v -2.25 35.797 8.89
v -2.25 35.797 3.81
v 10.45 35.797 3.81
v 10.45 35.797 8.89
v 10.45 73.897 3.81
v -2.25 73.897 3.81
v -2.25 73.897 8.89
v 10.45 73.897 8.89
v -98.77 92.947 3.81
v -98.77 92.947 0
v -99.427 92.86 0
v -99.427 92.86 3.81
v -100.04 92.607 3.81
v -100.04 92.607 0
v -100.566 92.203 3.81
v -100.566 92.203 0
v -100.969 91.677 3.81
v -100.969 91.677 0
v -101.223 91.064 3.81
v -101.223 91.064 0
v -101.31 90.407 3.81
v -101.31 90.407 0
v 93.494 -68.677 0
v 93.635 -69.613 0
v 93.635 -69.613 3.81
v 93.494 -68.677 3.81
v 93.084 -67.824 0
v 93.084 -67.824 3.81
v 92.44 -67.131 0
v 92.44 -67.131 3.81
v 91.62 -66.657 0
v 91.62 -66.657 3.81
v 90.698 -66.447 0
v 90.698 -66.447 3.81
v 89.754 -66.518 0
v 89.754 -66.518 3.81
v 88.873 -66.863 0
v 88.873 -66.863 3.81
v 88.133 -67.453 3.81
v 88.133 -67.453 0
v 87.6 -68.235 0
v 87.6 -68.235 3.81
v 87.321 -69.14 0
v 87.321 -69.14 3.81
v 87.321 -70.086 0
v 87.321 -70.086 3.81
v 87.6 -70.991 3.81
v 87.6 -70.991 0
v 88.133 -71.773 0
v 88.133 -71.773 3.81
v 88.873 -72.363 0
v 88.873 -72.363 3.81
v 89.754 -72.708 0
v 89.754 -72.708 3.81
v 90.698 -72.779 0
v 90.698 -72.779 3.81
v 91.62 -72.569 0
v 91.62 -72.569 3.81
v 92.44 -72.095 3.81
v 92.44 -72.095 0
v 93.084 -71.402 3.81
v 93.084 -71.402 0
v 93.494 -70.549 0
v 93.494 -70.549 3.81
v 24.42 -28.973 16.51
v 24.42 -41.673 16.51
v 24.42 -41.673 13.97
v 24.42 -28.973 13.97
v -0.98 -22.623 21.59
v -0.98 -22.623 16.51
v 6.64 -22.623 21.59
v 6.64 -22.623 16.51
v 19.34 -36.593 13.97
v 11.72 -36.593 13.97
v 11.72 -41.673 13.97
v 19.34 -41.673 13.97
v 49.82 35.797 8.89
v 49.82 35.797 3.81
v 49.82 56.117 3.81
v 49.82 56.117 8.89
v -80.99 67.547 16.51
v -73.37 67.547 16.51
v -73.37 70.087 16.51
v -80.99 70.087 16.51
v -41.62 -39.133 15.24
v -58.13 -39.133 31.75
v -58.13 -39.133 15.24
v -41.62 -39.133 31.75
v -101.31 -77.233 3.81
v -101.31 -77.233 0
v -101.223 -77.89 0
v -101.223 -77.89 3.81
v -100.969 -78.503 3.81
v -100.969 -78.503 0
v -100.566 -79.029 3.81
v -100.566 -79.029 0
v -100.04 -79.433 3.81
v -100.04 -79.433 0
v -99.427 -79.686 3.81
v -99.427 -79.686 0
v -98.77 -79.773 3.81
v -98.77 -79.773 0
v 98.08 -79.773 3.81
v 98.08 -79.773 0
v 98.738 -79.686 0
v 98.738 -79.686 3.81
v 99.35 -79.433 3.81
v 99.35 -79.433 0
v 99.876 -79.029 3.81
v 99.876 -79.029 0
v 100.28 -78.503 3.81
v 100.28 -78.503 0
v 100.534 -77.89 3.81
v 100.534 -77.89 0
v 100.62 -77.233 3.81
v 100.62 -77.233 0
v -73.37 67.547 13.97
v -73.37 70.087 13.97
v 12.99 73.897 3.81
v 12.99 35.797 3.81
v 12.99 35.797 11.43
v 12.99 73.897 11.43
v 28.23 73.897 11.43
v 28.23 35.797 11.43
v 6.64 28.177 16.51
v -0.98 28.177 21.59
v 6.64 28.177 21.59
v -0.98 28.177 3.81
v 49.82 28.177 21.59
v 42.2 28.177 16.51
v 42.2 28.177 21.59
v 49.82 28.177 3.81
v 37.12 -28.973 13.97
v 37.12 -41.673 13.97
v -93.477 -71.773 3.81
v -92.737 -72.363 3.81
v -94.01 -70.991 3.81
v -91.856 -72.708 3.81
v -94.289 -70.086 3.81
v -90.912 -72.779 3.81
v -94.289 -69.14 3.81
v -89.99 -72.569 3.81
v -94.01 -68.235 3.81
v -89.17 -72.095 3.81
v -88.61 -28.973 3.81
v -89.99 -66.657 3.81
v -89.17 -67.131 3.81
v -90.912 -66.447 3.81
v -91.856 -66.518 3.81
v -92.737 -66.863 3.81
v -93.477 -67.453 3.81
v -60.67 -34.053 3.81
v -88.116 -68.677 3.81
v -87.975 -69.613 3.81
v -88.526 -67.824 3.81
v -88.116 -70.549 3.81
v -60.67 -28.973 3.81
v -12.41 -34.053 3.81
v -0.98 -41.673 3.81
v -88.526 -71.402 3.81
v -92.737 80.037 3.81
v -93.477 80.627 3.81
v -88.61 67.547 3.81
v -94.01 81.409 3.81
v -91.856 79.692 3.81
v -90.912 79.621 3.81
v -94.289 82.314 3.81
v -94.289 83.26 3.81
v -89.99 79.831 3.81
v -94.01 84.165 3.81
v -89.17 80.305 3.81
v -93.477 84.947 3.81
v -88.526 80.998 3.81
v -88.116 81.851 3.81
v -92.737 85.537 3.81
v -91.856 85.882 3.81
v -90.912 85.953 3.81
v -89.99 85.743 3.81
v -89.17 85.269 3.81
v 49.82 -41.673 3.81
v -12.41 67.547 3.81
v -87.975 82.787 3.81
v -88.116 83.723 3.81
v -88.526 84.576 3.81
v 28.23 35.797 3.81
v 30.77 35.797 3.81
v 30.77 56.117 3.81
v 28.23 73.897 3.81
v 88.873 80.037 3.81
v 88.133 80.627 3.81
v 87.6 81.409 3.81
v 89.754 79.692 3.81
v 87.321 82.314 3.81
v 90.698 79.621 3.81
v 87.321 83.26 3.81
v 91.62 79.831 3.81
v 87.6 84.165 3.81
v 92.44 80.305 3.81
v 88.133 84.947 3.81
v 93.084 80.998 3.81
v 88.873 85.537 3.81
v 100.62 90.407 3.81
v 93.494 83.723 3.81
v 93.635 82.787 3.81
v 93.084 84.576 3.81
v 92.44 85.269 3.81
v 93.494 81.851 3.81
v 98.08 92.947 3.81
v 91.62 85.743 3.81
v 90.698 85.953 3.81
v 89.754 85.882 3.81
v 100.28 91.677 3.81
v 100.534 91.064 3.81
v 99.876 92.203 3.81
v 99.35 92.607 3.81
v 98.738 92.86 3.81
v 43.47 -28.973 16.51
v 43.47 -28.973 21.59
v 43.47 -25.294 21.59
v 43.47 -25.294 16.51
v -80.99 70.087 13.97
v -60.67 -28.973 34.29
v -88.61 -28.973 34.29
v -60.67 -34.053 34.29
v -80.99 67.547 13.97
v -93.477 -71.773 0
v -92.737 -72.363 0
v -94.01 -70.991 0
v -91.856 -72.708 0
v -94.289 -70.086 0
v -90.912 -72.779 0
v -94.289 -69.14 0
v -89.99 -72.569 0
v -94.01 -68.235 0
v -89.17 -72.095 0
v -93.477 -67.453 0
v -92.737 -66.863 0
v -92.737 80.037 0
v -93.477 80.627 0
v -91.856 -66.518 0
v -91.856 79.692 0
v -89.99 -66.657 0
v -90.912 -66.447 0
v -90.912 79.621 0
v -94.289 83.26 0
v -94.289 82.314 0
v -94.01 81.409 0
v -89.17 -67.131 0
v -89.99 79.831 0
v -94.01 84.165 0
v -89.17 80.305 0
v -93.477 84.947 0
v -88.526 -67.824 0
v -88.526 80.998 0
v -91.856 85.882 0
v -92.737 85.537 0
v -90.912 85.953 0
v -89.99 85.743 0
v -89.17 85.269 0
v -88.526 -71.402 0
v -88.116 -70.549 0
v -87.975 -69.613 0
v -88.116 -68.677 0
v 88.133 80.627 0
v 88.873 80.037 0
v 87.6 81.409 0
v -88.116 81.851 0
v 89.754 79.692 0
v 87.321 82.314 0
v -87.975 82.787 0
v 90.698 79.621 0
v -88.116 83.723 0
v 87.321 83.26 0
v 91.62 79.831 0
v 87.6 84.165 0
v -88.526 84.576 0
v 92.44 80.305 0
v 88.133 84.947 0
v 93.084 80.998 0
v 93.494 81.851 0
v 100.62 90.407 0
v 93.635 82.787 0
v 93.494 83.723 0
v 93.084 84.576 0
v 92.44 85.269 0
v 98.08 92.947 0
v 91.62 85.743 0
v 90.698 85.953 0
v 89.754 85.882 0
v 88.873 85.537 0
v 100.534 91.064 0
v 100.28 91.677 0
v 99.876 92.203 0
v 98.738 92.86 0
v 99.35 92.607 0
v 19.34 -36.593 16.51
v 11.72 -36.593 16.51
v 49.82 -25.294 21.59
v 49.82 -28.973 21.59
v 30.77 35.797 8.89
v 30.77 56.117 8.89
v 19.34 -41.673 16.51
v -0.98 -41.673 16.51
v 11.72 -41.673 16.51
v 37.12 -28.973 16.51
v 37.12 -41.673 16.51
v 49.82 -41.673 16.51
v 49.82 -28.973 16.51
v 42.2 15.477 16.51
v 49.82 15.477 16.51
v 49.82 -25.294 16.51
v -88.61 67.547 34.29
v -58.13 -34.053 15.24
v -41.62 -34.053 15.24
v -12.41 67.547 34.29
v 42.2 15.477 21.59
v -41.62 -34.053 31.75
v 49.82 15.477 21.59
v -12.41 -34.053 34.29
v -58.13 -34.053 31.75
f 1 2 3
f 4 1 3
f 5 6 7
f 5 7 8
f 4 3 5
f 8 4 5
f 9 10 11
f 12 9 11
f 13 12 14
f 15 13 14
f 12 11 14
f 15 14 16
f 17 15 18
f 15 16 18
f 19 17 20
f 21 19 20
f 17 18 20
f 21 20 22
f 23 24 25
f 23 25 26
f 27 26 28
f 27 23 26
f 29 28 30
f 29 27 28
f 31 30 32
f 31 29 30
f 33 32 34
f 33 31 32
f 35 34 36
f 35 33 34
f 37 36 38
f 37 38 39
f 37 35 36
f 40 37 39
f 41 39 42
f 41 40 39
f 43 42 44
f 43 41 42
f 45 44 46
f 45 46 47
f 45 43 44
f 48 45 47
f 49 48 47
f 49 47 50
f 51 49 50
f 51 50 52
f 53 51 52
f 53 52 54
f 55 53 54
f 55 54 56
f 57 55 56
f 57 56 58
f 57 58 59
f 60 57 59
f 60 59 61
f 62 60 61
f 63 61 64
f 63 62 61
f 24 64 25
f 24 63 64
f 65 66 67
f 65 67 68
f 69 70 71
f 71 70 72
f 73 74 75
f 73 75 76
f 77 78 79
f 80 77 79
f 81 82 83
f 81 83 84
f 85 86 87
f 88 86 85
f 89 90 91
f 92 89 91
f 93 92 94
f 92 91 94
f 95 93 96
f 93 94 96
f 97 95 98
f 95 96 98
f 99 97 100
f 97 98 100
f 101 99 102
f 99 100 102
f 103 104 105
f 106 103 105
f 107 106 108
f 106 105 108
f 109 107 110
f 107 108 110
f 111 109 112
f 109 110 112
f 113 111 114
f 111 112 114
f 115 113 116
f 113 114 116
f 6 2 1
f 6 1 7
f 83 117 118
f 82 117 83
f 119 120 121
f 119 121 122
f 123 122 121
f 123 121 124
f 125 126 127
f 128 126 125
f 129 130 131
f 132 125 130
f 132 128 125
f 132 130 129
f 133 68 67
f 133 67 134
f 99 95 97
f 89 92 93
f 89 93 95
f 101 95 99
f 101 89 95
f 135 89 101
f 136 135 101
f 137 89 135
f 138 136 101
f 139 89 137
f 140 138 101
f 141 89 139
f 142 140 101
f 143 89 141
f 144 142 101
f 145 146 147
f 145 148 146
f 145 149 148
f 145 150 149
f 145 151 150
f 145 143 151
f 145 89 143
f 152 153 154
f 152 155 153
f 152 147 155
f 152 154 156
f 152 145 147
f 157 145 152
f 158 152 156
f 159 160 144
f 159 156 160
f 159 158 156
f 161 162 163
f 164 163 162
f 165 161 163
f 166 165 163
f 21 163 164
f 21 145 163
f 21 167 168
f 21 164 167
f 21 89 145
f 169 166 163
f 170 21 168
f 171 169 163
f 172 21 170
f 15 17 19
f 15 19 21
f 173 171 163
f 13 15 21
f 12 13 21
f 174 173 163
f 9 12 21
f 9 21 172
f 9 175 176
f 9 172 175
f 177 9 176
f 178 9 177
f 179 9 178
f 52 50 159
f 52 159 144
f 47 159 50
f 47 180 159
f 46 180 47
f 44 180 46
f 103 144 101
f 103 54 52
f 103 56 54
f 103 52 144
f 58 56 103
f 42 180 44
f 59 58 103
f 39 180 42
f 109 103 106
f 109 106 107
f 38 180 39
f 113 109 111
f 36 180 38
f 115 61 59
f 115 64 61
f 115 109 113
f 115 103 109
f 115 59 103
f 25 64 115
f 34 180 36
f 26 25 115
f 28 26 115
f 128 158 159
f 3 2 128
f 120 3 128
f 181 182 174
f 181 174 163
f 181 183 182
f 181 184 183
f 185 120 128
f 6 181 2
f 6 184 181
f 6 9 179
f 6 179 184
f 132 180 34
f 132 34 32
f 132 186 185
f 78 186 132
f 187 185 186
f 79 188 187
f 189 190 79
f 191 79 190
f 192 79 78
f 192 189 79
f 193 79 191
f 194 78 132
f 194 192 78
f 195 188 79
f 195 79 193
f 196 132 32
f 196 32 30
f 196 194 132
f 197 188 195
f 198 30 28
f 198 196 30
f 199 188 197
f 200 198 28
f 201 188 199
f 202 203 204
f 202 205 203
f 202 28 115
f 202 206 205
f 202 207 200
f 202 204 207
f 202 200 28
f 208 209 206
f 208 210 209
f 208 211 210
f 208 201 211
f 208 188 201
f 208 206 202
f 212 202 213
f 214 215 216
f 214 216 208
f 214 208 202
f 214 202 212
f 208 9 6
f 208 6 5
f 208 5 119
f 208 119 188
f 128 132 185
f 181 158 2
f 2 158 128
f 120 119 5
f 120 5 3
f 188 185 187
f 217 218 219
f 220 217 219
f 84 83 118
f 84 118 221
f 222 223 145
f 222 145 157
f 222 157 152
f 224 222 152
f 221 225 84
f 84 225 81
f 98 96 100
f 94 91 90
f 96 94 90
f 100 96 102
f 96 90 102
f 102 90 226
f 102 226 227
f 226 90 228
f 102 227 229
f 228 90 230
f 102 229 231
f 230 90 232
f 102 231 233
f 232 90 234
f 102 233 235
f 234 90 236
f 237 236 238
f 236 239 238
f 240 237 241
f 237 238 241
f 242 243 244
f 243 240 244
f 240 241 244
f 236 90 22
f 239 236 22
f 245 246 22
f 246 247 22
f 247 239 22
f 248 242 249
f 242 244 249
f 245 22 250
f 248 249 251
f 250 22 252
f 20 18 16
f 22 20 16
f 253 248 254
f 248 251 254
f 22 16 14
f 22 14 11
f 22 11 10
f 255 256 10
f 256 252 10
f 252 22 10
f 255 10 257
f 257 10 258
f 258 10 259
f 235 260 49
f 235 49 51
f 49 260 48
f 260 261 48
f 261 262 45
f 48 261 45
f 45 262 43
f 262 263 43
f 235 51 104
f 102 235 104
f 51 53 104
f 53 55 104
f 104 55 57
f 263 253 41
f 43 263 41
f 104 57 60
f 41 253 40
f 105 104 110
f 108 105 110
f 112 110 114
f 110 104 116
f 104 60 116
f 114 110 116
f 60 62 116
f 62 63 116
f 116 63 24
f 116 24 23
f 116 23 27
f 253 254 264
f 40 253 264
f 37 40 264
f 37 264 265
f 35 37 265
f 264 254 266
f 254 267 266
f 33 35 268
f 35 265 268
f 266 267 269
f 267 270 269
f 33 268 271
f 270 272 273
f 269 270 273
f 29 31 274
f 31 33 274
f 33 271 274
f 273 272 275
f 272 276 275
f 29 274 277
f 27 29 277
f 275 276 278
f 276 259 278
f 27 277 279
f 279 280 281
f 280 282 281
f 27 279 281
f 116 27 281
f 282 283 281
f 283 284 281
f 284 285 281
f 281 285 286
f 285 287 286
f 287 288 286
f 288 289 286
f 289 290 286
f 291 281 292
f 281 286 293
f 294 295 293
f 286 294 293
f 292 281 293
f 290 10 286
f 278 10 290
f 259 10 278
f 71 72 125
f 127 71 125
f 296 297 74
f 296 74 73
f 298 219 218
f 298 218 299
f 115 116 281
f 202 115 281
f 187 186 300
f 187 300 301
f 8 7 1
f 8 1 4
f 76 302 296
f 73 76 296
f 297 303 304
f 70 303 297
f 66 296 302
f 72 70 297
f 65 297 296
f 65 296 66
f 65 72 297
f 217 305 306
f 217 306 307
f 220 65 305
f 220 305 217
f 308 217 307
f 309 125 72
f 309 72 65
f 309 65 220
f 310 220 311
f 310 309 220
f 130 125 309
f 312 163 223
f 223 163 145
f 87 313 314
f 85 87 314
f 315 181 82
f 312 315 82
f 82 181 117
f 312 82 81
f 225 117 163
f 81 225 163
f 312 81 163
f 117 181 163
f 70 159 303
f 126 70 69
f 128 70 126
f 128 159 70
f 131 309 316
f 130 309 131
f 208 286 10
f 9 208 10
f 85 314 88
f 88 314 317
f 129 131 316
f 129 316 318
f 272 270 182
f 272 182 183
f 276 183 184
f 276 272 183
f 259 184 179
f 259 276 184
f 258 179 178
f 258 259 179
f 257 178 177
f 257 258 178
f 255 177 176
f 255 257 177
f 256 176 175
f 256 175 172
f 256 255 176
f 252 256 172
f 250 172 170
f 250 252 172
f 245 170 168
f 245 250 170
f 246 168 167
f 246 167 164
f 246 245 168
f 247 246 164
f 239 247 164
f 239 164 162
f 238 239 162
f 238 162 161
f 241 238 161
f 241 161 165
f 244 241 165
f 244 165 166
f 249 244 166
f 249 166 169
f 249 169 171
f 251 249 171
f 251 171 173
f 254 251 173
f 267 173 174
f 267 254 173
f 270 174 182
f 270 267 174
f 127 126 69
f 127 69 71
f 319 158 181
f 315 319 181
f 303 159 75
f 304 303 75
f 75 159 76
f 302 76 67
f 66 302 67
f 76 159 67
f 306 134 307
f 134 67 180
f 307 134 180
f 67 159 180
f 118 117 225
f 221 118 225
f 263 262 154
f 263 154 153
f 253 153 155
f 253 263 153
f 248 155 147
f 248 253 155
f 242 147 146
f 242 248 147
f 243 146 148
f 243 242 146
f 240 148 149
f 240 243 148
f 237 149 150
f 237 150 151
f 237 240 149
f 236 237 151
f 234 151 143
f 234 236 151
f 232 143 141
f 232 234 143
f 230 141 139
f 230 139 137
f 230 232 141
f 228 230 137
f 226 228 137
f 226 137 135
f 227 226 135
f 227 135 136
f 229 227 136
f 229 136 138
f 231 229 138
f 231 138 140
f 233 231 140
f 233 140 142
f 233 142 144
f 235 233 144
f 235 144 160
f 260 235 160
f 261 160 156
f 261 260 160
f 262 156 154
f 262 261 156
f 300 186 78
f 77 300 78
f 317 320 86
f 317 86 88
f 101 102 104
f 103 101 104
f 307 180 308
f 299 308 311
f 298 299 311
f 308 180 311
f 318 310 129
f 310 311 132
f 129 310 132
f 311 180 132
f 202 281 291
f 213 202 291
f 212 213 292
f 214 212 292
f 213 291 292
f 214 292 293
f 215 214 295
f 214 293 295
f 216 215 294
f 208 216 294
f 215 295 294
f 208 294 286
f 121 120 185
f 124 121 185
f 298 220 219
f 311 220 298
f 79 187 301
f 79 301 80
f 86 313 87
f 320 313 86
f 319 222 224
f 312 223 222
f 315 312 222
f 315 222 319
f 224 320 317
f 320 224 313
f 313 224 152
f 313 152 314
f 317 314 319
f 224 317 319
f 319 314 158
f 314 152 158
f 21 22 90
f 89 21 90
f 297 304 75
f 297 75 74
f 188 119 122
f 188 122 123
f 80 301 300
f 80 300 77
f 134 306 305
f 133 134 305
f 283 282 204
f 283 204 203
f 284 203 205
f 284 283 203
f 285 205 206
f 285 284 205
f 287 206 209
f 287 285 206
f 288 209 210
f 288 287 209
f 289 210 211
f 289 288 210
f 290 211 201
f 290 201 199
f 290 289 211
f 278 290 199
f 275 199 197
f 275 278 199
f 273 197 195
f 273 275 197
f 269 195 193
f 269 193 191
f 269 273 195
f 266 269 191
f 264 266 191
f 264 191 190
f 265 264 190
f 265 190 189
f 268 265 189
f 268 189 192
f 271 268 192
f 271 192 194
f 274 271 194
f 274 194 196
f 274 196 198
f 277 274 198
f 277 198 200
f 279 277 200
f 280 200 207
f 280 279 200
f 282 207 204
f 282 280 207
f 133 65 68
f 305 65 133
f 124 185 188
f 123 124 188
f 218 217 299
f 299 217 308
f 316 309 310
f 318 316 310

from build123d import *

# Parameters (mm, degrees)
F0_R      = 3.175
F1_DEPTH  = 3.81
F3_DEPTH  = 30.48
F2_W      = 50.8
F2_H      = 69.85
F4_DEPTH  = 12.7
F2_W_2    = 19.05
F2_H_2    = 20.32
F5_DEPTH  = 5.08
F2_W_3    = 15.24
F2_H_3    = 38.1
F6_DEPTH  = 7.62
F2_W_4    = 12.7
F7_DEPTH  = 5.08
F8_W      = 16.51
F8_H      = 16.51
F9_DEPTH  = 5.08
F10_W     = 7.62
F10_H     = 2.54
F11_DEPTH = 2.54
F12_W     = 7.62
F12_H     = 12.7
F12_H_2   = 50.8
F13_DEPTH = 5.08
F14_W     = 6.35
F14_H     = 3.679095
F15_DEPTH = 5.08
F16_W     = 12.7
F16_H     = 12.7
F17_DEPTH = 2.54
F18_W     = 7.62
F18_H     = 5.08
F19_DEPTH = 2.54


with BuildPart() as f1:
    # F0 (on Top) → F1 (new body)
    with BuildSketch(Plane.XY):
        with BuildLine():
            Line((98.080416, 92.946989), (-98.769584, 92.946989))
            ThreePointArc((-98.769584, 92.946989), (-100.565635, 92.20304), (-101.309584, 90.406989))
            Line((-101.309584, 90.406989), (-101.309584, -77.233011))
            ThreePointArc((-101.309584, -77.233011), (-100.565635, -79.029062), (-98.769584, -79.773011))
            Line((-98.769584, -79.773011), (98.080416, -79.773011))
            ThreePointArc((98.080416, -79.773011), (99.876467, -79.029062), (100.620416, -77.233011))
            Line((100.620416, -77.233011), (100.620416, 90.406989))
            ThreePointArc((100.620416, 90.406989), (99.876467, 92.20304), (98.080416, 92.946989))
        make_face()
        with Locations((-91.149584, -69.613011)):
            Circle(F0_R, mode=Mode.SUBTRACT)
        with Locations((90.460416, -69.613011)):
            Circle(F0_R, mode=Mode.SUBTRACT)
        with Locations((-91.149584, 82.786989)):
            Circle(F0_R, mode=Mode.SUBTRACT)
        with Locations((90.460416, 82.786989)):
            Circle(F0_R, mode=Mode.SUBTRACT)
    extrude(amount=F1_DEPTH)

    # F2 (on face) → F3 (join)
    with BuildSketch(Plane.XY.offset(3.81)):
        Polygon((-12.409584, 67.546989), (-88.609584, 67.546989), (-88.609584, -28.973011), (-60.669584, -28.973011), (-60.669584, -34.053011), (-12.409584, -34.053011), align=None)
    extrude(amount=F3_DEPTH)

    # F2 (on face) → F4 (join)
    with BuildSketch(Plane.XY.offset(3.81)):
        with Locations((24.420416, -6.748011)):
            Rectangle(F2_W, F2_H)
    extrude(amount=F4_DEPTH)

    # F2 (on face) → F5 (join)
    with BuildSketch(Plane.XY.offset(3.81)):
        with Locations((40.295416, 45.956989)):
            Rectangle(F2_W_2, F2_H_2)
    extrude(amount=F5_DEPTH)

    # F2 (on face) → F6 (join)
    with BuildSketch(Plane.XY.offset(3.81)):
        with Locations((20.610416, 54.846989)):
            Rectangle(F2_W_3, F2_H_3)
    extrude(amount=F6_DEPTH)

    # F2 (on face) → F7 (join)
    with BuildSketch(Plane.XY.offset(3.81)):
        with Locations((4.100416, 54.846989)):
            Rectangle(F2_W_4, F2_H_3)
    extrude(amount=F7_DEPTH)

    # F8 (on face) → F9 (join)
    with BuildSketch(Plane.XZ.offset(34.053011)):
        with Locations((-49.874584, 23.495)):
            Rectangle(F8_W, F8_H)
    extrude(amount=F9_DEPTH)

    # F10 (on face) → F11 (join)
    with BuildSketch(Plane(origin=(0, 67.546989, 0), x_dir=(-1, 0, 0), z_dir=(0, 1, 0))):
        with Locations((77.179584, 15.24)):
            Rectangle(F10_W, F10_H)
    extrude(amount=F11_DEPTH)

    # F12 (on face) → F13 (join)
    with BuildSketch(Plane.XY.offset(16.51)):
        with Locations((46.010416, 21.826989)):
            Rectangle(F12_W, F12_H)
        with Locations((2.830416, 2.776989)):
            Rectangle(F12_W, F12_H_2)
    extrude(amount=F13_DEPTH)

    # F14 (on face) → F15 (join)
    with BuildSketch(Plane.XY.offset(16.51)):
        with Locations((46.645416, -27.133463)):
            Rectangle(F14_W, F14_H)
    extrude(amount=F15_DEPTH)

    # F16 (on face) → F17 (cut)
    with BuildSketch(Plane.XY.offset(16.51)):
        with Locations((30.770416, -35.323011)):
            Rectangle(F16_W, F16_H)
    extrude(amount=-F17_DEPTH, mode=Mode.SUBTRACT)

    # F18 (on face) → F19 (cut)
    with BuildSketch(Plane.XY.offset(16.51)):
        with Locations((15.530416, -39.133011)):
            Rectangle(F18_W, F18_H)
    extrude(amount=-F19_DEPTH, mode=Mode.SUBTRACT)


solid = f1.part
